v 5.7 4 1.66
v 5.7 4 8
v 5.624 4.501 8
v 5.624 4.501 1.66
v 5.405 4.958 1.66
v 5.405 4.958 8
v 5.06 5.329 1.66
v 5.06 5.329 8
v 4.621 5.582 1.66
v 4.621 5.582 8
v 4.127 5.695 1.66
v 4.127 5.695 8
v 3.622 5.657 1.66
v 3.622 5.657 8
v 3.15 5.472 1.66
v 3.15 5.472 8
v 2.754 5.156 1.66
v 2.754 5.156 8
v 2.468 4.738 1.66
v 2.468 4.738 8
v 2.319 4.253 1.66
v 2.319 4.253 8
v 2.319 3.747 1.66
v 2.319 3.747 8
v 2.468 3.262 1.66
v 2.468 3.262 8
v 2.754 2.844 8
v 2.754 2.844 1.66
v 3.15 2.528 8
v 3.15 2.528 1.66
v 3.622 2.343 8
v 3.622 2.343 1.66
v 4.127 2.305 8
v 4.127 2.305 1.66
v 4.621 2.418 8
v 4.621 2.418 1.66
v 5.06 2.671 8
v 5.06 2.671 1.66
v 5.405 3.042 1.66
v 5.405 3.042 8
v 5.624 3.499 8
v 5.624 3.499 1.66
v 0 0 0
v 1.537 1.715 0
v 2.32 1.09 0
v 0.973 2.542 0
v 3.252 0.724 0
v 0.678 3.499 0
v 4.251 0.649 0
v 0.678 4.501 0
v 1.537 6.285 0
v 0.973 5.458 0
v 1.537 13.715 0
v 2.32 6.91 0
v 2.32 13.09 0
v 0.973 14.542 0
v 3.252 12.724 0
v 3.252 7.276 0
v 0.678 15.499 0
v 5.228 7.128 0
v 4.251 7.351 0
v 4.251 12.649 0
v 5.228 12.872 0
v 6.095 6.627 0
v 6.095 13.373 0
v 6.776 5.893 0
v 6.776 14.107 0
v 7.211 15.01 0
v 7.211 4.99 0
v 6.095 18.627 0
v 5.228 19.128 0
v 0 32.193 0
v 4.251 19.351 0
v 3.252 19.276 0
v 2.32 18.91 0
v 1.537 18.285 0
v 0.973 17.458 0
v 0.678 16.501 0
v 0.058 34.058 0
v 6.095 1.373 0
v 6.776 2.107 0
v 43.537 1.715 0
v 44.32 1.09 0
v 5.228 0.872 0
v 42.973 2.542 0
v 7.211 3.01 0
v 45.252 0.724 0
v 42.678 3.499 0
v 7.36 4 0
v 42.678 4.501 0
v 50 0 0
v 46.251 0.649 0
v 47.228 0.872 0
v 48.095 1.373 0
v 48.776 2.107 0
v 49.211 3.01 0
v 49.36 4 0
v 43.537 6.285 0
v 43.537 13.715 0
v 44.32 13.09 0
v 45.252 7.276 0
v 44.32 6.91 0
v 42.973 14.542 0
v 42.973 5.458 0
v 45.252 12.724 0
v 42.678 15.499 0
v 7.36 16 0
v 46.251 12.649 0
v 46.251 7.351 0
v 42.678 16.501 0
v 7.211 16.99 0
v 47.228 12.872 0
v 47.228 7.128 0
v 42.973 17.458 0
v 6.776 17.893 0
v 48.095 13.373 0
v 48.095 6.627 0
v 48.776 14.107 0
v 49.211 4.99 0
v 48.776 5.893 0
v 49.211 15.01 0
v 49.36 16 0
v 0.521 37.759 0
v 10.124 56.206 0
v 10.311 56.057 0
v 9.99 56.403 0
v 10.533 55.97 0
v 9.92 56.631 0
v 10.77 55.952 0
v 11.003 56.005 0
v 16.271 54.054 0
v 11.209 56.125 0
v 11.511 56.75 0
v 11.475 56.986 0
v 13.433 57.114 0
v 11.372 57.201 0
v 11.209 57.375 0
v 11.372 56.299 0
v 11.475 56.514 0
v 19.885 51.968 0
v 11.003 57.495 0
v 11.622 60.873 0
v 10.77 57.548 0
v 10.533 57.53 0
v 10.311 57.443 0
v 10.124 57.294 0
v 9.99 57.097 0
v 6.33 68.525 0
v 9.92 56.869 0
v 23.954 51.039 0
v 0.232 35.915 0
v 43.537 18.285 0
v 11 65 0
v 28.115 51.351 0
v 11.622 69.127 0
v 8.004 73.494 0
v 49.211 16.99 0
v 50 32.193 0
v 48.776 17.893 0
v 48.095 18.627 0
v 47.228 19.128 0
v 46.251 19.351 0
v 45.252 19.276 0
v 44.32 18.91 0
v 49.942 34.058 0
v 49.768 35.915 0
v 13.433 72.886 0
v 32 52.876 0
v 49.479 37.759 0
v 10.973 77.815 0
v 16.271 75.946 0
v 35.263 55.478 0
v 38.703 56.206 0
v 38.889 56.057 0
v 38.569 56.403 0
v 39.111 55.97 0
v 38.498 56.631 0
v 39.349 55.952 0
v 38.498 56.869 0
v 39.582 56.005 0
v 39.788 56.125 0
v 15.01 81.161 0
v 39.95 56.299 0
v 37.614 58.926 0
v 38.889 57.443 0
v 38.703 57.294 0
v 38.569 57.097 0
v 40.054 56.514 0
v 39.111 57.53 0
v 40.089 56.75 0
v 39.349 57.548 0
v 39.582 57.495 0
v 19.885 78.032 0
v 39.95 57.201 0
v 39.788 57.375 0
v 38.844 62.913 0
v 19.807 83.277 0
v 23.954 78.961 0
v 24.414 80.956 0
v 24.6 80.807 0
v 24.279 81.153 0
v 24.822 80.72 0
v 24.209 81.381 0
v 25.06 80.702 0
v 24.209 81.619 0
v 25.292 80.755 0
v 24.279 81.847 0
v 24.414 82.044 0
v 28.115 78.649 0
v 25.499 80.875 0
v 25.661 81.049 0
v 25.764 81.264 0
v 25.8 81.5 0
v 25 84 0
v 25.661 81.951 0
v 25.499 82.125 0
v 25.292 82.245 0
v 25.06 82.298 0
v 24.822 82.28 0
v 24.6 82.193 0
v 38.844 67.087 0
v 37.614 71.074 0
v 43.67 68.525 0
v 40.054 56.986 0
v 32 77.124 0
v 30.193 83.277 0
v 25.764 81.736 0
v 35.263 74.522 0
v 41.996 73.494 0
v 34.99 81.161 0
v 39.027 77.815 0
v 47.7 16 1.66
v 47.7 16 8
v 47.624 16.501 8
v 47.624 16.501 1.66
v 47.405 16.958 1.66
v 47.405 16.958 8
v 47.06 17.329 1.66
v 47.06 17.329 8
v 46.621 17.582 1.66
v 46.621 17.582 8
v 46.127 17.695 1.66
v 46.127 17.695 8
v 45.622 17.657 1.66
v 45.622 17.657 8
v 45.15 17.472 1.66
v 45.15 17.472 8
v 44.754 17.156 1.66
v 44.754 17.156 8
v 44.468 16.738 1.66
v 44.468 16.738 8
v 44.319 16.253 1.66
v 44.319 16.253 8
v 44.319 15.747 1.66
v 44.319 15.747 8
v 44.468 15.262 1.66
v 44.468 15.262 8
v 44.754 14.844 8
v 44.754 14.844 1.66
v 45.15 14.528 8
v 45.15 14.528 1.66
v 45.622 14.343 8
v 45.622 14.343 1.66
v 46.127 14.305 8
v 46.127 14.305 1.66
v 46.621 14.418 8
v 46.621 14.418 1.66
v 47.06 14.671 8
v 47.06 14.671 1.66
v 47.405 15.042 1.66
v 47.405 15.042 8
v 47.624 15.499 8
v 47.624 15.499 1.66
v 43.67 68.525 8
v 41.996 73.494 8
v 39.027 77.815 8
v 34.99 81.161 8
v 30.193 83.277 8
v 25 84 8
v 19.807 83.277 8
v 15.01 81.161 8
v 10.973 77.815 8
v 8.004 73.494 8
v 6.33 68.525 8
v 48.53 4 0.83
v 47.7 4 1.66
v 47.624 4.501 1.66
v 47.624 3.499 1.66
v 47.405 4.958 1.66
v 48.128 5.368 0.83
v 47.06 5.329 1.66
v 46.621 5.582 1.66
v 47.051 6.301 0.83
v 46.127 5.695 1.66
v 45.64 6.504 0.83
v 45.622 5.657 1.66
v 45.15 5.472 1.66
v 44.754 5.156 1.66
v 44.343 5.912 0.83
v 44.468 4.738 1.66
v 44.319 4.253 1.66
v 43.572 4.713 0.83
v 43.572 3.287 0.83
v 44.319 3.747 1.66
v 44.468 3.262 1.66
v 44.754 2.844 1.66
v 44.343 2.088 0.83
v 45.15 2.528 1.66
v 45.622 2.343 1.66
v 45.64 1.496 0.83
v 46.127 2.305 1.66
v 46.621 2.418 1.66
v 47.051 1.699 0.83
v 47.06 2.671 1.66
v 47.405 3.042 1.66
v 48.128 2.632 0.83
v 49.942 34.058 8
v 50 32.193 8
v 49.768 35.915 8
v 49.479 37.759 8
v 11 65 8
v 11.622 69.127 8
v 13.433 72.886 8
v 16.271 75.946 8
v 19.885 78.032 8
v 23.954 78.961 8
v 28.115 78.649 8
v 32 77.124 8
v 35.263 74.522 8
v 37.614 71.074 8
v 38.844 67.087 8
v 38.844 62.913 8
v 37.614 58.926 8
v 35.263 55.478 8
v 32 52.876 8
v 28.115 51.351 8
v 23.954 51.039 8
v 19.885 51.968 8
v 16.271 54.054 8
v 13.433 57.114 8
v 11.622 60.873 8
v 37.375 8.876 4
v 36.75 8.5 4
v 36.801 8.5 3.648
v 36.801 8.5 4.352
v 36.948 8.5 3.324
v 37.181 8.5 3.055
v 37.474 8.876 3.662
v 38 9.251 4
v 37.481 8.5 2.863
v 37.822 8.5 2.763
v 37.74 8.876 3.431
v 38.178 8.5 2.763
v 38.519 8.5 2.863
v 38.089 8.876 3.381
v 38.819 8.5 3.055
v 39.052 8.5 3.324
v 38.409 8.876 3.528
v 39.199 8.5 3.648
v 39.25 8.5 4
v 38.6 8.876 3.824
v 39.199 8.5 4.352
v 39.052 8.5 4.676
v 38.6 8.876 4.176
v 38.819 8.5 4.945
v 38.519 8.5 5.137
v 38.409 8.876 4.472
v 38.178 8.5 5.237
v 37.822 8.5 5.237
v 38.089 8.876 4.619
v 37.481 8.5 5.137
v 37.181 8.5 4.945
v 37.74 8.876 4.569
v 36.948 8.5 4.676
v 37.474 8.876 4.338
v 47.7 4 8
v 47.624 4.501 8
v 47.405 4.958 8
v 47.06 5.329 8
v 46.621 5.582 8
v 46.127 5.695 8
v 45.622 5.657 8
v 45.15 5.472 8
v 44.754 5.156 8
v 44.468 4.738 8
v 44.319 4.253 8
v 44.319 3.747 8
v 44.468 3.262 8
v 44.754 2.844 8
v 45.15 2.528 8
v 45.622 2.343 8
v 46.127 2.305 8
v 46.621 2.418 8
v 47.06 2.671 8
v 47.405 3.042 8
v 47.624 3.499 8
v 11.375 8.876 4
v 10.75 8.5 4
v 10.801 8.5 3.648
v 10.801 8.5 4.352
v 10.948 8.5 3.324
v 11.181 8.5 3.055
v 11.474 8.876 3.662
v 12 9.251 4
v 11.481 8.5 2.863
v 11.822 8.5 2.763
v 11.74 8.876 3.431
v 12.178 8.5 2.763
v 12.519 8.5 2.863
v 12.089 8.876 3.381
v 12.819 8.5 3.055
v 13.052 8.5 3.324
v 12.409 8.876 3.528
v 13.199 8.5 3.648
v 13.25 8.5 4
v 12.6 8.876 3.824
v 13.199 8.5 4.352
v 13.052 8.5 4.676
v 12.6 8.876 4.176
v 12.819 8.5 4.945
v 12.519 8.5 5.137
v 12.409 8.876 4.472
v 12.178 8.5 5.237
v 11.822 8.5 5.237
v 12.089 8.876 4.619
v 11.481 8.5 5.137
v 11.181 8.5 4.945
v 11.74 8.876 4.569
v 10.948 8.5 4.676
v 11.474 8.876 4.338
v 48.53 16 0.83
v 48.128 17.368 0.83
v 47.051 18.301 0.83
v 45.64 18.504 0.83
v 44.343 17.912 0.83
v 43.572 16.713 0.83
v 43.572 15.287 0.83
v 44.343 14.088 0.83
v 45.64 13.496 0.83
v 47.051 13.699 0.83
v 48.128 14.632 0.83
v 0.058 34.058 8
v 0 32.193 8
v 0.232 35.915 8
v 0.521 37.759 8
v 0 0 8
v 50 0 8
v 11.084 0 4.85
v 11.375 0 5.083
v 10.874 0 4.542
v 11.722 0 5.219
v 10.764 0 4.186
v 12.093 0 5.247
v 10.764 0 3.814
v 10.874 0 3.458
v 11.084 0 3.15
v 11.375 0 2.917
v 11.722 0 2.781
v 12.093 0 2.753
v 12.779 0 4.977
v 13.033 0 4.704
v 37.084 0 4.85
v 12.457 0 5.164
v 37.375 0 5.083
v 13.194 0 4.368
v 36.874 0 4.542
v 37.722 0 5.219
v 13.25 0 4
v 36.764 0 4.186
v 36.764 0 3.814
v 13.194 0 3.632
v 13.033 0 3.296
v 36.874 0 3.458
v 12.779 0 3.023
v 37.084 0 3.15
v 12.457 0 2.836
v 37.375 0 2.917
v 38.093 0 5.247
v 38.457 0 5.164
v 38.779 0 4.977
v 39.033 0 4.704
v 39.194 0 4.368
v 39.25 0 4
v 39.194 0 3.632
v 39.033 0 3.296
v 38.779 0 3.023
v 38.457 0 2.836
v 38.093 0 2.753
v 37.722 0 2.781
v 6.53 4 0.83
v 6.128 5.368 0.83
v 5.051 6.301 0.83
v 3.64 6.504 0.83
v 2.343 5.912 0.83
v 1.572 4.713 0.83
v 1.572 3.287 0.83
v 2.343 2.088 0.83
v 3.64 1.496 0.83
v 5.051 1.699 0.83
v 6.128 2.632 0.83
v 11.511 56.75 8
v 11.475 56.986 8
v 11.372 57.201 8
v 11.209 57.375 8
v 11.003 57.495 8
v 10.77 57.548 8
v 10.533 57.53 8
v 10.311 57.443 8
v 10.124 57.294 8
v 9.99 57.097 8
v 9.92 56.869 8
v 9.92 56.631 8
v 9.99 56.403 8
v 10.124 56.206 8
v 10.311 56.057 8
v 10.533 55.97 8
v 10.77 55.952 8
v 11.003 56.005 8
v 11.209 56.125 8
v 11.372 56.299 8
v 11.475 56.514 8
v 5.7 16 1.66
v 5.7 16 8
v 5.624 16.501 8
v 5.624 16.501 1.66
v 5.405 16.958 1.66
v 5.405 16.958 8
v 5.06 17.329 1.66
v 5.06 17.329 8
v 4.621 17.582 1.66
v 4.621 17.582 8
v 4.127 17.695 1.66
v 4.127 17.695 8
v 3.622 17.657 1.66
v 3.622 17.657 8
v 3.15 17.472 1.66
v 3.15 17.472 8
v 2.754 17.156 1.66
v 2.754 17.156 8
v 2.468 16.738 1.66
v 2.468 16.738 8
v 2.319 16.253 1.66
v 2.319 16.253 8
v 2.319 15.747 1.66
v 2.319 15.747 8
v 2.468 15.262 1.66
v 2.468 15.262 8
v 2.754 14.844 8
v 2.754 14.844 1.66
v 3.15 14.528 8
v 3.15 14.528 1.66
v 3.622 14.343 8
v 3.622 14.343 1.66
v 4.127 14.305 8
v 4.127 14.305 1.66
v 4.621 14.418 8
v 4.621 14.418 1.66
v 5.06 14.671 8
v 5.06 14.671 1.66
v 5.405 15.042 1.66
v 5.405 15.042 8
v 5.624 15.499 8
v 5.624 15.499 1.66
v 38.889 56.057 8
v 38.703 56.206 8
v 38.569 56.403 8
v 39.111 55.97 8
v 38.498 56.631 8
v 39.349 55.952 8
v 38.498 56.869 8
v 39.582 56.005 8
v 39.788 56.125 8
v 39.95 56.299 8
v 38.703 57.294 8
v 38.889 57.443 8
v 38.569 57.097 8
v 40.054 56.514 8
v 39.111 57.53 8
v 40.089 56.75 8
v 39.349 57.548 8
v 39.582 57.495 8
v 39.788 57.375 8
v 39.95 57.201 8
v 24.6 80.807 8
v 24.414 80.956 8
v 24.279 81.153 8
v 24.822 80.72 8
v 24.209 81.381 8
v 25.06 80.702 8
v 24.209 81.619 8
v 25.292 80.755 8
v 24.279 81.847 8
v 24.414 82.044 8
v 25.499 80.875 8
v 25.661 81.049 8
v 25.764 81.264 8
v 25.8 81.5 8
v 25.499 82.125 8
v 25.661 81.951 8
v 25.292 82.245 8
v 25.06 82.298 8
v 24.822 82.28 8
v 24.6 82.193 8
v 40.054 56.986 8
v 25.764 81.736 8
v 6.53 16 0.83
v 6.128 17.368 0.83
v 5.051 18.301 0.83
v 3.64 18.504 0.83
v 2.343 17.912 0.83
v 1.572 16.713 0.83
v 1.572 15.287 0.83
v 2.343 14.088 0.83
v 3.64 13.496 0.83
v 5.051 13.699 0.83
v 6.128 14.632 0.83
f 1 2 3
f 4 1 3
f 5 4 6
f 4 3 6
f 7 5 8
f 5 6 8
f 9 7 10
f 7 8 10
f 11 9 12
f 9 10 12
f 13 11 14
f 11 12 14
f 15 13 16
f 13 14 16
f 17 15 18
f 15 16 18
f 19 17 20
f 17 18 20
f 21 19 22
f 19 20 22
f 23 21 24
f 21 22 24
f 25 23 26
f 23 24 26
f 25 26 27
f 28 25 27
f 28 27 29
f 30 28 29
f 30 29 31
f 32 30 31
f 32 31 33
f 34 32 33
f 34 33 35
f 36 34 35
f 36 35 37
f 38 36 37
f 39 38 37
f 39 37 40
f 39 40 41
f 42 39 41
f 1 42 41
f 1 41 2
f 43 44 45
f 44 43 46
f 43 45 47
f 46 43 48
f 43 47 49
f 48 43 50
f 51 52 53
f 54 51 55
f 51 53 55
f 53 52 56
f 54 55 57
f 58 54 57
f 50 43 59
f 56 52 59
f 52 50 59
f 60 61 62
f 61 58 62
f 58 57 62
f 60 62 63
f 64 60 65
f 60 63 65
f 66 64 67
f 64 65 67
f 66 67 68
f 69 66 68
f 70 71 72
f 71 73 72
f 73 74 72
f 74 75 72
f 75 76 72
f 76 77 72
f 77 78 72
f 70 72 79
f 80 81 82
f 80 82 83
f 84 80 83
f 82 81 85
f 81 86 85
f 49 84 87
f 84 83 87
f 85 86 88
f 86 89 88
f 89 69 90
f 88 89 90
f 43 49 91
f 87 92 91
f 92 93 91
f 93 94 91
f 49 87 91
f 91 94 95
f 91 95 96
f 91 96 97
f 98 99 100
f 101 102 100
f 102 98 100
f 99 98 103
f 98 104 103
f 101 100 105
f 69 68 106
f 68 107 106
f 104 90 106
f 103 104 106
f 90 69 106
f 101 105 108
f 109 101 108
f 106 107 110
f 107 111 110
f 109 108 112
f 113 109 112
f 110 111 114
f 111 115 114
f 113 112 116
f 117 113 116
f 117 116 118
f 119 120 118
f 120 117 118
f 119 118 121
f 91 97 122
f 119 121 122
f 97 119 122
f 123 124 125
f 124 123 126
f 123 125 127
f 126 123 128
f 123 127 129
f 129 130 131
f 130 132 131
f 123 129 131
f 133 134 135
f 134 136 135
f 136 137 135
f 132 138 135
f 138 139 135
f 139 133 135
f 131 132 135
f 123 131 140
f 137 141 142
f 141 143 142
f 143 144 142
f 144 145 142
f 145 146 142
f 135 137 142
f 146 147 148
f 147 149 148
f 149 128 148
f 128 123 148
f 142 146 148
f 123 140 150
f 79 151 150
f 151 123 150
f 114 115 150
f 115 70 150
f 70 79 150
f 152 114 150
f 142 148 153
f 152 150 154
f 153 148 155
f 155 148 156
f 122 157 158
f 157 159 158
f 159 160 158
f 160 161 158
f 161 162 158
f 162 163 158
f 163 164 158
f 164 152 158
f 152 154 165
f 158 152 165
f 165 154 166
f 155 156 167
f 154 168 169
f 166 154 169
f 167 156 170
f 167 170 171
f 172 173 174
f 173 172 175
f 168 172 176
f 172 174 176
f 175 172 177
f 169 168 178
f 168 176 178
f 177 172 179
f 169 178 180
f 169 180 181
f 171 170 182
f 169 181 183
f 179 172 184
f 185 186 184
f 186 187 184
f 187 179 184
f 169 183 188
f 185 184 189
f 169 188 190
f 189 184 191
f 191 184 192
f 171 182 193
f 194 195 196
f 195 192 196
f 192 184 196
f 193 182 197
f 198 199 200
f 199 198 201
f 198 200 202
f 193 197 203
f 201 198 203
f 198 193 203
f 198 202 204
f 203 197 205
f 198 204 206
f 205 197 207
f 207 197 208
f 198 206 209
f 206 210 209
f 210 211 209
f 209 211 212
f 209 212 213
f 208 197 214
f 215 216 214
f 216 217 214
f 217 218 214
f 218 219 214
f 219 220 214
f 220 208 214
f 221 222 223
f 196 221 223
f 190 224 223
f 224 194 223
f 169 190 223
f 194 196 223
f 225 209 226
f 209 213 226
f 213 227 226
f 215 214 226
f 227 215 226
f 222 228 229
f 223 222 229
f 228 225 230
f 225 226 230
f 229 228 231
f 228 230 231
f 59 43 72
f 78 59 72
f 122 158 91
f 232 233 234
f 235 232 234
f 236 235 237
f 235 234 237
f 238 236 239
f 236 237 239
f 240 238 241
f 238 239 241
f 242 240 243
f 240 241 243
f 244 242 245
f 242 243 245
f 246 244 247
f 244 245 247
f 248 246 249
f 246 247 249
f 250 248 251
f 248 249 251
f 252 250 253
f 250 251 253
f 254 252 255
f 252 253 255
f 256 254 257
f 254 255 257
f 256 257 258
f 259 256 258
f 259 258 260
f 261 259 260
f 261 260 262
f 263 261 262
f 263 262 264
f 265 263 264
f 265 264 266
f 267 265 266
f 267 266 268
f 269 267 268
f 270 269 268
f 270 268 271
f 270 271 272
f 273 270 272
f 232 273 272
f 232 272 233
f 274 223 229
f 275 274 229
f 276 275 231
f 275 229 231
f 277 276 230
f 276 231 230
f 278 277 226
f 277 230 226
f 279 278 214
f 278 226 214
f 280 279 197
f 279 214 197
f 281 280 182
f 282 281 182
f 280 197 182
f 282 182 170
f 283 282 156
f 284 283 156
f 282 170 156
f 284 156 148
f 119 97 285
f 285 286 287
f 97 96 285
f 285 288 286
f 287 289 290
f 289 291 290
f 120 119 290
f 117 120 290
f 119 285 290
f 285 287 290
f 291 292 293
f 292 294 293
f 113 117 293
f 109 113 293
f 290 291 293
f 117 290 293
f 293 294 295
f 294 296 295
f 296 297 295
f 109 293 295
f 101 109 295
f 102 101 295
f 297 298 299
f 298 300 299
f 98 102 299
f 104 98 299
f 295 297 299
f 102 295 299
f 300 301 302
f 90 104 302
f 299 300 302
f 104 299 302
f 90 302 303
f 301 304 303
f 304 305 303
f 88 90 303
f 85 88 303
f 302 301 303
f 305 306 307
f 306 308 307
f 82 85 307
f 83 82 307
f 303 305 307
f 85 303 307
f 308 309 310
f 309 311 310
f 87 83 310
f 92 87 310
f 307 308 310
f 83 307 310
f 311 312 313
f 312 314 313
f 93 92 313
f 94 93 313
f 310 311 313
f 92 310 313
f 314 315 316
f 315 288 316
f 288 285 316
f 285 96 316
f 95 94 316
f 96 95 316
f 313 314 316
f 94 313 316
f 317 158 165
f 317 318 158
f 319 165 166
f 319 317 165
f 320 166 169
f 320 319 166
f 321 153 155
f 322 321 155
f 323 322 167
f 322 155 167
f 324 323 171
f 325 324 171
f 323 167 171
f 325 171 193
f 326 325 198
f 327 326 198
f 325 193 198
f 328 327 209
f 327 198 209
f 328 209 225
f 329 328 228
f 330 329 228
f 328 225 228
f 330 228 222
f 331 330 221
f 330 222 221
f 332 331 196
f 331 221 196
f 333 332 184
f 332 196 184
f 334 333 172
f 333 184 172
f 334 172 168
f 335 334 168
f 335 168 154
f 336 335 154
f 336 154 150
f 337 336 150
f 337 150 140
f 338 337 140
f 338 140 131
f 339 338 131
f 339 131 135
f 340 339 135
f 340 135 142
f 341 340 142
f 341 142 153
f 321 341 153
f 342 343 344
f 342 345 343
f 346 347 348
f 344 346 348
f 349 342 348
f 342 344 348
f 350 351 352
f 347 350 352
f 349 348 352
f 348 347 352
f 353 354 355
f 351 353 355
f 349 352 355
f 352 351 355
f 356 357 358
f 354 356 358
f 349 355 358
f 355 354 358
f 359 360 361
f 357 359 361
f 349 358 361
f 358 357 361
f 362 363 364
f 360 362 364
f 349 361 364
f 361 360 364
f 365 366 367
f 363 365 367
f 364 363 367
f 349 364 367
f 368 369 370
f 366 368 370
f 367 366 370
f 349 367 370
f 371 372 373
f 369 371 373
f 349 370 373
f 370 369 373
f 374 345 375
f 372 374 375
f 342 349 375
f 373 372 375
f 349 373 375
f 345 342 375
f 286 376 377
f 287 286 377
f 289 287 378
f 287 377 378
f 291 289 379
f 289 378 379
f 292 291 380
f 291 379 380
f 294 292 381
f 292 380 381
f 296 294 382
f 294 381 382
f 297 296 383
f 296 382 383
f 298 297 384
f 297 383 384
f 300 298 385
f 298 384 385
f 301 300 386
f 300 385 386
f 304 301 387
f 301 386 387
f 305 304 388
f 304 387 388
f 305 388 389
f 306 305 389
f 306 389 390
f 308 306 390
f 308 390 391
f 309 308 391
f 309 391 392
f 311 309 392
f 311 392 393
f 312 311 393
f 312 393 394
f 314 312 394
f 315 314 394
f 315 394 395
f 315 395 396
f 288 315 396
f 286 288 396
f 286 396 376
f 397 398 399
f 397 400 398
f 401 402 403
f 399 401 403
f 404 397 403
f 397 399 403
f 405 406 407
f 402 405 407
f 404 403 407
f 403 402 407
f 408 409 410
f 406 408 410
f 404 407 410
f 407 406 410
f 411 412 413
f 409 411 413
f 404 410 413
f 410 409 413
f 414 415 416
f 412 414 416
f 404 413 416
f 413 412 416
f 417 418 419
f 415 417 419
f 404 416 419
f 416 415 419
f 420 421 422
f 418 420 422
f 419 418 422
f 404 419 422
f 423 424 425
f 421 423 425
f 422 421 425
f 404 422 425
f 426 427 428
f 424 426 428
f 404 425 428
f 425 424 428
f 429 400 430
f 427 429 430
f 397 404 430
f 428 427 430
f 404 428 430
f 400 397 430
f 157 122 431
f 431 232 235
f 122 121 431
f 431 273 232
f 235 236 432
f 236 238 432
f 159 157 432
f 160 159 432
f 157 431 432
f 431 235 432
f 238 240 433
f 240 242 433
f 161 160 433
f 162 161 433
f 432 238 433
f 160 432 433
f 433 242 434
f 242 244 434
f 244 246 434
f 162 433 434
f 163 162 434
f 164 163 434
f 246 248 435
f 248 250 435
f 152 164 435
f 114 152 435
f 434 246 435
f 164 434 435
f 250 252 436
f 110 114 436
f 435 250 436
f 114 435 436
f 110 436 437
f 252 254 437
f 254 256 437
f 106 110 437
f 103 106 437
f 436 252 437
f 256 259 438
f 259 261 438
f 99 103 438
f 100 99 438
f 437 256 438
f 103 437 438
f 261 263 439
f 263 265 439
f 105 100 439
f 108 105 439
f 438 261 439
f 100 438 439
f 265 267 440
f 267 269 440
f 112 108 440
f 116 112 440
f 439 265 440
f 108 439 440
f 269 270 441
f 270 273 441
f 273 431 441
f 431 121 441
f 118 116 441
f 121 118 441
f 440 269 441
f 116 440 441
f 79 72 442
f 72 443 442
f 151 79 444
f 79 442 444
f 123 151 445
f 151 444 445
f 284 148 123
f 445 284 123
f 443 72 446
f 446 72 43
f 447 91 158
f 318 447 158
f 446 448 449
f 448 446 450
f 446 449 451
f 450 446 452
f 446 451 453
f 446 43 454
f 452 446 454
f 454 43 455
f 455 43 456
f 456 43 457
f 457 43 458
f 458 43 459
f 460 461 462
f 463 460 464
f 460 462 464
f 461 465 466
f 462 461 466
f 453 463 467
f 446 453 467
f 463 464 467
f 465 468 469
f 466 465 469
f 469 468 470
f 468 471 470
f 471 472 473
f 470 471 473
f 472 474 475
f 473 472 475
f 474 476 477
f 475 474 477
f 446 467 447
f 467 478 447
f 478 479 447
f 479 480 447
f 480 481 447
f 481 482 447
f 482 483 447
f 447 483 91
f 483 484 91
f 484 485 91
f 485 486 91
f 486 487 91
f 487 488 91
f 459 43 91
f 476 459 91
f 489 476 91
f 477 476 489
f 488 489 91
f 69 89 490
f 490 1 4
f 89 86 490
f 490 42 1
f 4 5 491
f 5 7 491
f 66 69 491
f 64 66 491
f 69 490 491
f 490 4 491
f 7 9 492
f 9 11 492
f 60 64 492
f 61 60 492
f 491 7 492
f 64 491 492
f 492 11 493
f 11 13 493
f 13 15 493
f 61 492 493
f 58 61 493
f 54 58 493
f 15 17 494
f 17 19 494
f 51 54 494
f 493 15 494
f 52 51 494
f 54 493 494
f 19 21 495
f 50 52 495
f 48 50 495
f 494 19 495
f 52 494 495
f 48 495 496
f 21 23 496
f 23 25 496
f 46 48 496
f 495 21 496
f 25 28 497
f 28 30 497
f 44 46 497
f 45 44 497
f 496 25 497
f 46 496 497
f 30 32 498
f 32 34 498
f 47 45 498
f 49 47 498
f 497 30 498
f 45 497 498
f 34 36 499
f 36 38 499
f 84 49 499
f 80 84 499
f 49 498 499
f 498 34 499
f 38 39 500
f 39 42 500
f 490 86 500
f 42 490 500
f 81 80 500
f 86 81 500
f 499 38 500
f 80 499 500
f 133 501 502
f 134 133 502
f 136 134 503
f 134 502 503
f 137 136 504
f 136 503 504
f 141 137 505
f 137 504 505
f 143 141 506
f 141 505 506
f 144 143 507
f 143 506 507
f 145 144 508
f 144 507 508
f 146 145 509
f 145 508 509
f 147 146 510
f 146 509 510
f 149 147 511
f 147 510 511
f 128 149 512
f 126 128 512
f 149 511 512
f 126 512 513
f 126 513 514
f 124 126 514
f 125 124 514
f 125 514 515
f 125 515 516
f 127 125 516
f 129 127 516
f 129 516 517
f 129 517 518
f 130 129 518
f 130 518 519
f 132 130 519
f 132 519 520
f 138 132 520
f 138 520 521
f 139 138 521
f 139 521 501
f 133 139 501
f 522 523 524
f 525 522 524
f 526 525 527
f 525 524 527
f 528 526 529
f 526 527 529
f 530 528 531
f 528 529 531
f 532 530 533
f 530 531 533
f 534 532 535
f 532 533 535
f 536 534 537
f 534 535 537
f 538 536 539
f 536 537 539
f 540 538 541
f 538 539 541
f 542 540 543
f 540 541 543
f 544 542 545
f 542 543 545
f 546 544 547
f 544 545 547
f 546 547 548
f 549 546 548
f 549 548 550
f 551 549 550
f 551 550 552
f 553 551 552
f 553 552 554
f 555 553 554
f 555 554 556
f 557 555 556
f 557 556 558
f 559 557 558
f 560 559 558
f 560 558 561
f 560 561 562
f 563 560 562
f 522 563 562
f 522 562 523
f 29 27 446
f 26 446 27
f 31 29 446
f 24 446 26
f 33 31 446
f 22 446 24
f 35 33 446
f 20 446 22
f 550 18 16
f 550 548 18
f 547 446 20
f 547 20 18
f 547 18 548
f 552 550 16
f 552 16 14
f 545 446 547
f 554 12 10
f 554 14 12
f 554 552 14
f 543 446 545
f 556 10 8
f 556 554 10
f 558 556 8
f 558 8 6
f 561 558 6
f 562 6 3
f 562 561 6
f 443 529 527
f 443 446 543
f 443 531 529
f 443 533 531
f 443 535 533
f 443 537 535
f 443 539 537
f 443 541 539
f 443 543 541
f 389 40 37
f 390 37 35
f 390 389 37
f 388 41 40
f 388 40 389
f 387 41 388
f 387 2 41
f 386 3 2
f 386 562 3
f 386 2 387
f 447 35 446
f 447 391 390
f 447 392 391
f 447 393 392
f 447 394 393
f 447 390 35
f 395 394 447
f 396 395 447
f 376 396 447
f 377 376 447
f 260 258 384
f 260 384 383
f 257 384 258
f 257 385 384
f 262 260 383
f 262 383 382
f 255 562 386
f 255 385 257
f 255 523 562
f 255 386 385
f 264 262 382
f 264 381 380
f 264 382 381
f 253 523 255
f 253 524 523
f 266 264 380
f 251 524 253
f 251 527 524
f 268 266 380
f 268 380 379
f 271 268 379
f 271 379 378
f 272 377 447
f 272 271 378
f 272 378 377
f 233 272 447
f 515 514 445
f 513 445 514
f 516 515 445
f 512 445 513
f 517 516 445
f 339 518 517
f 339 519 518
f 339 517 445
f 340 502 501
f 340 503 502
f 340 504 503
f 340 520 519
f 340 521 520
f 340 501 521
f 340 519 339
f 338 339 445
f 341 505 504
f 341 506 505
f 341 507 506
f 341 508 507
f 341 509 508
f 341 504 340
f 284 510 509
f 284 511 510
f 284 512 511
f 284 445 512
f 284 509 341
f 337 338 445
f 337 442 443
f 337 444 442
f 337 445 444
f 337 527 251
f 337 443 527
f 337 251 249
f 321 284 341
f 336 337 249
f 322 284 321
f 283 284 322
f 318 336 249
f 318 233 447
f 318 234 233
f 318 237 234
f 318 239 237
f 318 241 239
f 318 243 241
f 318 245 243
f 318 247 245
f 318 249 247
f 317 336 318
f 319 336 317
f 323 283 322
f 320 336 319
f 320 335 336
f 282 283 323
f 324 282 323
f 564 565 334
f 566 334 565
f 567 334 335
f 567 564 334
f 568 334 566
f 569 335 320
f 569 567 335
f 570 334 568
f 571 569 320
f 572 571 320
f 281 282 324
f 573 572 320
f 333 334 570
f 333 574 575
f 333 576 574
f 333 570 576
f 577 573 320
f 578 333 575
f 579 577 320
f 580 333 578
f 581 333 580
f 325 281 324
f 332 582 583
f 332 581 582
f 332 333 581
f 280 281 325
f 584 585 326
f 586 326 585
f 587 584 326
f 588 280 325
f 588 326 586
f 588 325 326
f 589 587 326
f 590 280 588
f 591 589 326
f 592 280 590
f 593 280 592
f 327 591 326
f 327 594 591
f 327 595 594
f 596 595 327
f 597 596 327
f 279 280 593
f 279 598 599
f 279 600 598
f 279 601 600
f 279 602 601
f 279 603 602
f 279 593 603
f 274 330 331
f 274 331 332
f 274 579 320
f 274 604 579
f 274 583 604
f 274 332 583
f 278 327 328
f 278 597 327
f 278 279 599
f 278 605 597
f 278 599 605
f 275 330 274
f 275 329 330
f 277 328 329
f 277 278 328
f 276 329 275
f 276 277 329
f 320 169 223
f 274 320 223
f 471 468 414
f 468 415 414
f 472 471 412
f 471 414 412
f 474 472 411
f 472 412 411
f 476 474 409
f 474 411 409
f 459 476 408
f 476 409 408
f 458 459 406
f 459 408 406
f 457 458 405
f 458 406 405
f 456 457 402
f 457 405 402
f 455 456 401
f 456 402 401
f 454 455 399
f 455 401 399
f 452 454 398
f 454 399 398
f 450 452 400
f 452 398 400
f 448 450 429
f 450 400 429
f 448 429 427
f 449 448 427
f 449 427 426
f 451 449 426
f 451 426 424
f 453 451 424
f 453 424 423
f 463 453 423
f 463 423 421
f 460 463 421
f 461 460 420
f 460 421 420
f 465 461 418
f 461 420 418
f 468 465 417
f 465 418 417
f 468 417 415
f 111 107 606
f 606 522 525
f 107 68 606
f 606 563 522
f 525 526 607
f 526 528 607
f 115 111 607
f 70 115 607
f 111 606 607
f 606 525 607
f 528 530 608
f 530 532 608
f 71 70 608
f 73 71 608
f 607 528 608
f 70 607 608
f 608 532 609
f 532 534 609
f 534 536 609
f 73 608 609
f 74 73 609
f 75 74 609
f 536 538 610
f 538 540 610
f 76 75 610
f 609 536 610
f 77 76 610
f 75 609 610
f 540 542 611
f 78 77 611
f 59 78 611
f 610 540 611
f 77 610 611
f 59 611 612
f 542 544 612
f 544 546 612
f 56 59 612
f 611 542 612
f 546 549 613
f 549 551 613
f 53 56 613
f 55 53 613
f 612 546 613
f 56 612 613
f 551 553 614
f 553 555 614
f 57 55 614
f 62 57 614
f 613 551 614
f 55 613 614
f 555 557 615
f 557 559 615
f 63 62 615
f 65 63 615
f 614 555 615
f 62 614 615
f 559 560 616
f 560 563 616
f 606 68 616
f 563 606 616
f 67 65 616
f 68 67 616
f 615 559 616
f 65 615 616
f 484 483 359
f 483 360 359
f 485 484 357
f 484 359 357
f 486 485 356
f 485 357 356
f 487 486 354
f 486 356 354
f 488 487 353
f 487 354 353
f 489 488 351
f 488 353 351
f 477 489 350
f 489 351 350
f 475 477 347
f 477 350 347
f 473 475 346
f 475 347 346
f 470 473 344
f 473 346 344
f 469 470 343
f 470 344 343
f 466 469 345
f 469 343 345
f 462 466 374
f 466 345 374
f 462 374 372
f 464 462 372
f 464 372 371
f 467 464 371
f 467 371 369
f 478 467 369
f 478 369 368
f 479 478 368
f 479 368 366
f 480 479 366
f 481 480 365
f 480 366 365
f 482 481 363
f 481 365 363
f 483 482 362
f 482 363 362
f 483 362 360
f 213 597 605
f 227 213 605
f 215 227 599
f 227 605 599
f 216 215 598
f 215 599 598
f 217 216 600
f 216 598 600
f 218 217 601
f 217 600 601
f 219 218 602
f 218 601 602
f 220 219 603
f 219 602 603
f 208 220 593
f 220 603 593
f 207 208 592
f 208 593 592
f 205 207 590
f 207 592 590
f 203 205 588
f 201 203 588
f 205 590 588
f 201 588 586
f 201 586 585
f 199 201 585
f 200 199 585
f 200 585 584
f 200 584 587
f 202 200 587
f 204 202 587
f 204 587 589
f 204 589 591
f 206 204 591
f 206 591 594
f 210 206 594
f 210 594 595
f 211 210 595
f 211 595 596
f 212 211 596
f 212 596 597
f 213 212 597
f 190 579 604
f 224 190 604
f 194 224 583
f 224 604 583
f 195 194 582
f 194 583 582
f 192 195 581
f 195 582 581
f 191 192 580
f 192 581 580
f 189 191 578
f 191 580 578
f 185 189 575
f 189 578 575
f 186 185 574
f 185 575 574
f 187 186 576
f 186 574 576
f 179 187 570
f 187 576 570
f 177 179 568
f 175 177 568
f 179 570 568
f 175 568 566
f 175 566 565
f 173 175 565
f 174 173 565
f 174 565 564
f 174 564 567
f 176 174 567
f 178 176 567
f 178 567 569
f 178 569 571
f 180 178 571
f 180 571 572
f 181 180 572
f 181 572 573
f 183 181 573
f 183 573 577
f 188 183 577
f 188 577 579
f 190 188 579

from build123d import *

# Parameters (mm, degrees)
EXTRUDE_1_DEPTH              = 8
FILLET_1_R                   = 30
CUT_EXTRUDE_1_REACH          = 10
SKETCH_2_R                   = 14
HOLE_WIZARD_M3_1_D           = 3.4
HOLE_WIZARD_M3_1_DEPTH       = 8
HOLE_WIZARD_M3_1_CSINK_D     = 6.72
HOLE_WIZARD_M3_1_CSINK_ANGLE = 90
HOLE_WIZARD_M3_1_2_D         = 2.5
HOLE_WIZARD_M3_1_2_DEPTH     = 8.5
HOLE_WIZARD_M3_1_2_TIP       = 0.751075774
HOLE_WIZARD_M2_1_D           = 1.6


with BuildPart() as part:
    # 스케치1 → 보스-돌출1 (new body)
    with BuildSketch(Plane.XY):
        with BuildLine():
            Line((0, 35), (0, 0))
            Line((0, 0), (50, 0))
            Line((50, 0), (50, 35))
            Line((50, 35), (43.670126691, 68.525105576))
            ThreePointArc((43.670126691, 68.525105576), (25, 84), (6.329873309, 68.525105576))
            Line((6.329873309, 68.525105576), (0, 35))
        make_face()
    extrude(amount=EXTRUDE_1_DEPTH)

    # 필렛1
    fillet_1_edges = [part.edges().sort_by_distance(p)[0] for p in [
        (50, 35, 4),
        (0, 35, 4),
    ]]
    fillet(fillet_1_edges, radius=FILLET_1_R)

    # 스케치2 → 컷-돌출1 (cut, up to next)
    with BuildSketch(Plane(origin=(0, 0, 0), x_dir=(-1, 0, 0), z_dir=(0, 0, -1)), mode=Mode.PRIVATE) as cut_extrude_1_sk1:
        with Locations((-25, 65)):
            Circle(SKETCH_2_R)
    cut_extrude_1_tool1 = extrude(cut_extrude_1_sk1.sketch, amount=-CUT_EXTRUDE_1_REACH, mode=Mode.PRIVATE) & part.part
    add(cut_extrude_1_tool1.solids().sort_by_distance((25, 65, 0))[0], mode=Mode.SUBTRACT)

    # Hole Wizard M3 _ _ _ _ _ _ _1
    with Locations(Plane(origin=(0, 0, 0), x_dir=(-1, 0, 0), z_dir=(0, 0, -1))):
        with Locations((-4, 16), (-4, 4), (-46, 16), (-46, 4)):
            CounterSinkHole(HOLE_WIZARD_M3_1_D / 2, HOLE_WIZARD_M3_1_CSINK_D / 2, depth=HOLE_WIZARD_M3_1_DEPTH, counter_sink_angle=HOLE_WIZARD_M3_1_CSINK_ANGLE)

    # Hole Wizard M3 _ _1 2
    with Locations(Plane(origin=(0, 0, 0), x_dir=(-1, 0, 0), z_dir=(0, -1, 0))):
        with Locations((-38, -4), (-12, -4)):
            Hole(HOLE_WIZARD_M3_1_2_D / 2, depth=HOLE_WIZARD_M3_1_2_DEPTH)
            with Locations((0, 0, -(HOLE_WIZARD_M3_1_2_DEPTH + HOLE_WIZARD_M3_1_2_TIP / 2))):  # 118° drill point
                Cone(0, HOLE_WIZARD_M3_1_2_D / 2, HOLE_WIZARD_M3_1_2_TIP, mode=Mode.SUBTRACT)

    # M2 나사 구멍1 (through all)
    with Locations(Plane(origin=(0, 0, 0), x_dir=(-1, 0, 0), z_dir=(0, 0, -1))):
        with Locations((-10.710580838, 56.75), (-25, 81.5), (-39.289419162, 56.75)):
            Hole(HOLE_WIZARD_M2_1_D / 2)


solid = part.part
